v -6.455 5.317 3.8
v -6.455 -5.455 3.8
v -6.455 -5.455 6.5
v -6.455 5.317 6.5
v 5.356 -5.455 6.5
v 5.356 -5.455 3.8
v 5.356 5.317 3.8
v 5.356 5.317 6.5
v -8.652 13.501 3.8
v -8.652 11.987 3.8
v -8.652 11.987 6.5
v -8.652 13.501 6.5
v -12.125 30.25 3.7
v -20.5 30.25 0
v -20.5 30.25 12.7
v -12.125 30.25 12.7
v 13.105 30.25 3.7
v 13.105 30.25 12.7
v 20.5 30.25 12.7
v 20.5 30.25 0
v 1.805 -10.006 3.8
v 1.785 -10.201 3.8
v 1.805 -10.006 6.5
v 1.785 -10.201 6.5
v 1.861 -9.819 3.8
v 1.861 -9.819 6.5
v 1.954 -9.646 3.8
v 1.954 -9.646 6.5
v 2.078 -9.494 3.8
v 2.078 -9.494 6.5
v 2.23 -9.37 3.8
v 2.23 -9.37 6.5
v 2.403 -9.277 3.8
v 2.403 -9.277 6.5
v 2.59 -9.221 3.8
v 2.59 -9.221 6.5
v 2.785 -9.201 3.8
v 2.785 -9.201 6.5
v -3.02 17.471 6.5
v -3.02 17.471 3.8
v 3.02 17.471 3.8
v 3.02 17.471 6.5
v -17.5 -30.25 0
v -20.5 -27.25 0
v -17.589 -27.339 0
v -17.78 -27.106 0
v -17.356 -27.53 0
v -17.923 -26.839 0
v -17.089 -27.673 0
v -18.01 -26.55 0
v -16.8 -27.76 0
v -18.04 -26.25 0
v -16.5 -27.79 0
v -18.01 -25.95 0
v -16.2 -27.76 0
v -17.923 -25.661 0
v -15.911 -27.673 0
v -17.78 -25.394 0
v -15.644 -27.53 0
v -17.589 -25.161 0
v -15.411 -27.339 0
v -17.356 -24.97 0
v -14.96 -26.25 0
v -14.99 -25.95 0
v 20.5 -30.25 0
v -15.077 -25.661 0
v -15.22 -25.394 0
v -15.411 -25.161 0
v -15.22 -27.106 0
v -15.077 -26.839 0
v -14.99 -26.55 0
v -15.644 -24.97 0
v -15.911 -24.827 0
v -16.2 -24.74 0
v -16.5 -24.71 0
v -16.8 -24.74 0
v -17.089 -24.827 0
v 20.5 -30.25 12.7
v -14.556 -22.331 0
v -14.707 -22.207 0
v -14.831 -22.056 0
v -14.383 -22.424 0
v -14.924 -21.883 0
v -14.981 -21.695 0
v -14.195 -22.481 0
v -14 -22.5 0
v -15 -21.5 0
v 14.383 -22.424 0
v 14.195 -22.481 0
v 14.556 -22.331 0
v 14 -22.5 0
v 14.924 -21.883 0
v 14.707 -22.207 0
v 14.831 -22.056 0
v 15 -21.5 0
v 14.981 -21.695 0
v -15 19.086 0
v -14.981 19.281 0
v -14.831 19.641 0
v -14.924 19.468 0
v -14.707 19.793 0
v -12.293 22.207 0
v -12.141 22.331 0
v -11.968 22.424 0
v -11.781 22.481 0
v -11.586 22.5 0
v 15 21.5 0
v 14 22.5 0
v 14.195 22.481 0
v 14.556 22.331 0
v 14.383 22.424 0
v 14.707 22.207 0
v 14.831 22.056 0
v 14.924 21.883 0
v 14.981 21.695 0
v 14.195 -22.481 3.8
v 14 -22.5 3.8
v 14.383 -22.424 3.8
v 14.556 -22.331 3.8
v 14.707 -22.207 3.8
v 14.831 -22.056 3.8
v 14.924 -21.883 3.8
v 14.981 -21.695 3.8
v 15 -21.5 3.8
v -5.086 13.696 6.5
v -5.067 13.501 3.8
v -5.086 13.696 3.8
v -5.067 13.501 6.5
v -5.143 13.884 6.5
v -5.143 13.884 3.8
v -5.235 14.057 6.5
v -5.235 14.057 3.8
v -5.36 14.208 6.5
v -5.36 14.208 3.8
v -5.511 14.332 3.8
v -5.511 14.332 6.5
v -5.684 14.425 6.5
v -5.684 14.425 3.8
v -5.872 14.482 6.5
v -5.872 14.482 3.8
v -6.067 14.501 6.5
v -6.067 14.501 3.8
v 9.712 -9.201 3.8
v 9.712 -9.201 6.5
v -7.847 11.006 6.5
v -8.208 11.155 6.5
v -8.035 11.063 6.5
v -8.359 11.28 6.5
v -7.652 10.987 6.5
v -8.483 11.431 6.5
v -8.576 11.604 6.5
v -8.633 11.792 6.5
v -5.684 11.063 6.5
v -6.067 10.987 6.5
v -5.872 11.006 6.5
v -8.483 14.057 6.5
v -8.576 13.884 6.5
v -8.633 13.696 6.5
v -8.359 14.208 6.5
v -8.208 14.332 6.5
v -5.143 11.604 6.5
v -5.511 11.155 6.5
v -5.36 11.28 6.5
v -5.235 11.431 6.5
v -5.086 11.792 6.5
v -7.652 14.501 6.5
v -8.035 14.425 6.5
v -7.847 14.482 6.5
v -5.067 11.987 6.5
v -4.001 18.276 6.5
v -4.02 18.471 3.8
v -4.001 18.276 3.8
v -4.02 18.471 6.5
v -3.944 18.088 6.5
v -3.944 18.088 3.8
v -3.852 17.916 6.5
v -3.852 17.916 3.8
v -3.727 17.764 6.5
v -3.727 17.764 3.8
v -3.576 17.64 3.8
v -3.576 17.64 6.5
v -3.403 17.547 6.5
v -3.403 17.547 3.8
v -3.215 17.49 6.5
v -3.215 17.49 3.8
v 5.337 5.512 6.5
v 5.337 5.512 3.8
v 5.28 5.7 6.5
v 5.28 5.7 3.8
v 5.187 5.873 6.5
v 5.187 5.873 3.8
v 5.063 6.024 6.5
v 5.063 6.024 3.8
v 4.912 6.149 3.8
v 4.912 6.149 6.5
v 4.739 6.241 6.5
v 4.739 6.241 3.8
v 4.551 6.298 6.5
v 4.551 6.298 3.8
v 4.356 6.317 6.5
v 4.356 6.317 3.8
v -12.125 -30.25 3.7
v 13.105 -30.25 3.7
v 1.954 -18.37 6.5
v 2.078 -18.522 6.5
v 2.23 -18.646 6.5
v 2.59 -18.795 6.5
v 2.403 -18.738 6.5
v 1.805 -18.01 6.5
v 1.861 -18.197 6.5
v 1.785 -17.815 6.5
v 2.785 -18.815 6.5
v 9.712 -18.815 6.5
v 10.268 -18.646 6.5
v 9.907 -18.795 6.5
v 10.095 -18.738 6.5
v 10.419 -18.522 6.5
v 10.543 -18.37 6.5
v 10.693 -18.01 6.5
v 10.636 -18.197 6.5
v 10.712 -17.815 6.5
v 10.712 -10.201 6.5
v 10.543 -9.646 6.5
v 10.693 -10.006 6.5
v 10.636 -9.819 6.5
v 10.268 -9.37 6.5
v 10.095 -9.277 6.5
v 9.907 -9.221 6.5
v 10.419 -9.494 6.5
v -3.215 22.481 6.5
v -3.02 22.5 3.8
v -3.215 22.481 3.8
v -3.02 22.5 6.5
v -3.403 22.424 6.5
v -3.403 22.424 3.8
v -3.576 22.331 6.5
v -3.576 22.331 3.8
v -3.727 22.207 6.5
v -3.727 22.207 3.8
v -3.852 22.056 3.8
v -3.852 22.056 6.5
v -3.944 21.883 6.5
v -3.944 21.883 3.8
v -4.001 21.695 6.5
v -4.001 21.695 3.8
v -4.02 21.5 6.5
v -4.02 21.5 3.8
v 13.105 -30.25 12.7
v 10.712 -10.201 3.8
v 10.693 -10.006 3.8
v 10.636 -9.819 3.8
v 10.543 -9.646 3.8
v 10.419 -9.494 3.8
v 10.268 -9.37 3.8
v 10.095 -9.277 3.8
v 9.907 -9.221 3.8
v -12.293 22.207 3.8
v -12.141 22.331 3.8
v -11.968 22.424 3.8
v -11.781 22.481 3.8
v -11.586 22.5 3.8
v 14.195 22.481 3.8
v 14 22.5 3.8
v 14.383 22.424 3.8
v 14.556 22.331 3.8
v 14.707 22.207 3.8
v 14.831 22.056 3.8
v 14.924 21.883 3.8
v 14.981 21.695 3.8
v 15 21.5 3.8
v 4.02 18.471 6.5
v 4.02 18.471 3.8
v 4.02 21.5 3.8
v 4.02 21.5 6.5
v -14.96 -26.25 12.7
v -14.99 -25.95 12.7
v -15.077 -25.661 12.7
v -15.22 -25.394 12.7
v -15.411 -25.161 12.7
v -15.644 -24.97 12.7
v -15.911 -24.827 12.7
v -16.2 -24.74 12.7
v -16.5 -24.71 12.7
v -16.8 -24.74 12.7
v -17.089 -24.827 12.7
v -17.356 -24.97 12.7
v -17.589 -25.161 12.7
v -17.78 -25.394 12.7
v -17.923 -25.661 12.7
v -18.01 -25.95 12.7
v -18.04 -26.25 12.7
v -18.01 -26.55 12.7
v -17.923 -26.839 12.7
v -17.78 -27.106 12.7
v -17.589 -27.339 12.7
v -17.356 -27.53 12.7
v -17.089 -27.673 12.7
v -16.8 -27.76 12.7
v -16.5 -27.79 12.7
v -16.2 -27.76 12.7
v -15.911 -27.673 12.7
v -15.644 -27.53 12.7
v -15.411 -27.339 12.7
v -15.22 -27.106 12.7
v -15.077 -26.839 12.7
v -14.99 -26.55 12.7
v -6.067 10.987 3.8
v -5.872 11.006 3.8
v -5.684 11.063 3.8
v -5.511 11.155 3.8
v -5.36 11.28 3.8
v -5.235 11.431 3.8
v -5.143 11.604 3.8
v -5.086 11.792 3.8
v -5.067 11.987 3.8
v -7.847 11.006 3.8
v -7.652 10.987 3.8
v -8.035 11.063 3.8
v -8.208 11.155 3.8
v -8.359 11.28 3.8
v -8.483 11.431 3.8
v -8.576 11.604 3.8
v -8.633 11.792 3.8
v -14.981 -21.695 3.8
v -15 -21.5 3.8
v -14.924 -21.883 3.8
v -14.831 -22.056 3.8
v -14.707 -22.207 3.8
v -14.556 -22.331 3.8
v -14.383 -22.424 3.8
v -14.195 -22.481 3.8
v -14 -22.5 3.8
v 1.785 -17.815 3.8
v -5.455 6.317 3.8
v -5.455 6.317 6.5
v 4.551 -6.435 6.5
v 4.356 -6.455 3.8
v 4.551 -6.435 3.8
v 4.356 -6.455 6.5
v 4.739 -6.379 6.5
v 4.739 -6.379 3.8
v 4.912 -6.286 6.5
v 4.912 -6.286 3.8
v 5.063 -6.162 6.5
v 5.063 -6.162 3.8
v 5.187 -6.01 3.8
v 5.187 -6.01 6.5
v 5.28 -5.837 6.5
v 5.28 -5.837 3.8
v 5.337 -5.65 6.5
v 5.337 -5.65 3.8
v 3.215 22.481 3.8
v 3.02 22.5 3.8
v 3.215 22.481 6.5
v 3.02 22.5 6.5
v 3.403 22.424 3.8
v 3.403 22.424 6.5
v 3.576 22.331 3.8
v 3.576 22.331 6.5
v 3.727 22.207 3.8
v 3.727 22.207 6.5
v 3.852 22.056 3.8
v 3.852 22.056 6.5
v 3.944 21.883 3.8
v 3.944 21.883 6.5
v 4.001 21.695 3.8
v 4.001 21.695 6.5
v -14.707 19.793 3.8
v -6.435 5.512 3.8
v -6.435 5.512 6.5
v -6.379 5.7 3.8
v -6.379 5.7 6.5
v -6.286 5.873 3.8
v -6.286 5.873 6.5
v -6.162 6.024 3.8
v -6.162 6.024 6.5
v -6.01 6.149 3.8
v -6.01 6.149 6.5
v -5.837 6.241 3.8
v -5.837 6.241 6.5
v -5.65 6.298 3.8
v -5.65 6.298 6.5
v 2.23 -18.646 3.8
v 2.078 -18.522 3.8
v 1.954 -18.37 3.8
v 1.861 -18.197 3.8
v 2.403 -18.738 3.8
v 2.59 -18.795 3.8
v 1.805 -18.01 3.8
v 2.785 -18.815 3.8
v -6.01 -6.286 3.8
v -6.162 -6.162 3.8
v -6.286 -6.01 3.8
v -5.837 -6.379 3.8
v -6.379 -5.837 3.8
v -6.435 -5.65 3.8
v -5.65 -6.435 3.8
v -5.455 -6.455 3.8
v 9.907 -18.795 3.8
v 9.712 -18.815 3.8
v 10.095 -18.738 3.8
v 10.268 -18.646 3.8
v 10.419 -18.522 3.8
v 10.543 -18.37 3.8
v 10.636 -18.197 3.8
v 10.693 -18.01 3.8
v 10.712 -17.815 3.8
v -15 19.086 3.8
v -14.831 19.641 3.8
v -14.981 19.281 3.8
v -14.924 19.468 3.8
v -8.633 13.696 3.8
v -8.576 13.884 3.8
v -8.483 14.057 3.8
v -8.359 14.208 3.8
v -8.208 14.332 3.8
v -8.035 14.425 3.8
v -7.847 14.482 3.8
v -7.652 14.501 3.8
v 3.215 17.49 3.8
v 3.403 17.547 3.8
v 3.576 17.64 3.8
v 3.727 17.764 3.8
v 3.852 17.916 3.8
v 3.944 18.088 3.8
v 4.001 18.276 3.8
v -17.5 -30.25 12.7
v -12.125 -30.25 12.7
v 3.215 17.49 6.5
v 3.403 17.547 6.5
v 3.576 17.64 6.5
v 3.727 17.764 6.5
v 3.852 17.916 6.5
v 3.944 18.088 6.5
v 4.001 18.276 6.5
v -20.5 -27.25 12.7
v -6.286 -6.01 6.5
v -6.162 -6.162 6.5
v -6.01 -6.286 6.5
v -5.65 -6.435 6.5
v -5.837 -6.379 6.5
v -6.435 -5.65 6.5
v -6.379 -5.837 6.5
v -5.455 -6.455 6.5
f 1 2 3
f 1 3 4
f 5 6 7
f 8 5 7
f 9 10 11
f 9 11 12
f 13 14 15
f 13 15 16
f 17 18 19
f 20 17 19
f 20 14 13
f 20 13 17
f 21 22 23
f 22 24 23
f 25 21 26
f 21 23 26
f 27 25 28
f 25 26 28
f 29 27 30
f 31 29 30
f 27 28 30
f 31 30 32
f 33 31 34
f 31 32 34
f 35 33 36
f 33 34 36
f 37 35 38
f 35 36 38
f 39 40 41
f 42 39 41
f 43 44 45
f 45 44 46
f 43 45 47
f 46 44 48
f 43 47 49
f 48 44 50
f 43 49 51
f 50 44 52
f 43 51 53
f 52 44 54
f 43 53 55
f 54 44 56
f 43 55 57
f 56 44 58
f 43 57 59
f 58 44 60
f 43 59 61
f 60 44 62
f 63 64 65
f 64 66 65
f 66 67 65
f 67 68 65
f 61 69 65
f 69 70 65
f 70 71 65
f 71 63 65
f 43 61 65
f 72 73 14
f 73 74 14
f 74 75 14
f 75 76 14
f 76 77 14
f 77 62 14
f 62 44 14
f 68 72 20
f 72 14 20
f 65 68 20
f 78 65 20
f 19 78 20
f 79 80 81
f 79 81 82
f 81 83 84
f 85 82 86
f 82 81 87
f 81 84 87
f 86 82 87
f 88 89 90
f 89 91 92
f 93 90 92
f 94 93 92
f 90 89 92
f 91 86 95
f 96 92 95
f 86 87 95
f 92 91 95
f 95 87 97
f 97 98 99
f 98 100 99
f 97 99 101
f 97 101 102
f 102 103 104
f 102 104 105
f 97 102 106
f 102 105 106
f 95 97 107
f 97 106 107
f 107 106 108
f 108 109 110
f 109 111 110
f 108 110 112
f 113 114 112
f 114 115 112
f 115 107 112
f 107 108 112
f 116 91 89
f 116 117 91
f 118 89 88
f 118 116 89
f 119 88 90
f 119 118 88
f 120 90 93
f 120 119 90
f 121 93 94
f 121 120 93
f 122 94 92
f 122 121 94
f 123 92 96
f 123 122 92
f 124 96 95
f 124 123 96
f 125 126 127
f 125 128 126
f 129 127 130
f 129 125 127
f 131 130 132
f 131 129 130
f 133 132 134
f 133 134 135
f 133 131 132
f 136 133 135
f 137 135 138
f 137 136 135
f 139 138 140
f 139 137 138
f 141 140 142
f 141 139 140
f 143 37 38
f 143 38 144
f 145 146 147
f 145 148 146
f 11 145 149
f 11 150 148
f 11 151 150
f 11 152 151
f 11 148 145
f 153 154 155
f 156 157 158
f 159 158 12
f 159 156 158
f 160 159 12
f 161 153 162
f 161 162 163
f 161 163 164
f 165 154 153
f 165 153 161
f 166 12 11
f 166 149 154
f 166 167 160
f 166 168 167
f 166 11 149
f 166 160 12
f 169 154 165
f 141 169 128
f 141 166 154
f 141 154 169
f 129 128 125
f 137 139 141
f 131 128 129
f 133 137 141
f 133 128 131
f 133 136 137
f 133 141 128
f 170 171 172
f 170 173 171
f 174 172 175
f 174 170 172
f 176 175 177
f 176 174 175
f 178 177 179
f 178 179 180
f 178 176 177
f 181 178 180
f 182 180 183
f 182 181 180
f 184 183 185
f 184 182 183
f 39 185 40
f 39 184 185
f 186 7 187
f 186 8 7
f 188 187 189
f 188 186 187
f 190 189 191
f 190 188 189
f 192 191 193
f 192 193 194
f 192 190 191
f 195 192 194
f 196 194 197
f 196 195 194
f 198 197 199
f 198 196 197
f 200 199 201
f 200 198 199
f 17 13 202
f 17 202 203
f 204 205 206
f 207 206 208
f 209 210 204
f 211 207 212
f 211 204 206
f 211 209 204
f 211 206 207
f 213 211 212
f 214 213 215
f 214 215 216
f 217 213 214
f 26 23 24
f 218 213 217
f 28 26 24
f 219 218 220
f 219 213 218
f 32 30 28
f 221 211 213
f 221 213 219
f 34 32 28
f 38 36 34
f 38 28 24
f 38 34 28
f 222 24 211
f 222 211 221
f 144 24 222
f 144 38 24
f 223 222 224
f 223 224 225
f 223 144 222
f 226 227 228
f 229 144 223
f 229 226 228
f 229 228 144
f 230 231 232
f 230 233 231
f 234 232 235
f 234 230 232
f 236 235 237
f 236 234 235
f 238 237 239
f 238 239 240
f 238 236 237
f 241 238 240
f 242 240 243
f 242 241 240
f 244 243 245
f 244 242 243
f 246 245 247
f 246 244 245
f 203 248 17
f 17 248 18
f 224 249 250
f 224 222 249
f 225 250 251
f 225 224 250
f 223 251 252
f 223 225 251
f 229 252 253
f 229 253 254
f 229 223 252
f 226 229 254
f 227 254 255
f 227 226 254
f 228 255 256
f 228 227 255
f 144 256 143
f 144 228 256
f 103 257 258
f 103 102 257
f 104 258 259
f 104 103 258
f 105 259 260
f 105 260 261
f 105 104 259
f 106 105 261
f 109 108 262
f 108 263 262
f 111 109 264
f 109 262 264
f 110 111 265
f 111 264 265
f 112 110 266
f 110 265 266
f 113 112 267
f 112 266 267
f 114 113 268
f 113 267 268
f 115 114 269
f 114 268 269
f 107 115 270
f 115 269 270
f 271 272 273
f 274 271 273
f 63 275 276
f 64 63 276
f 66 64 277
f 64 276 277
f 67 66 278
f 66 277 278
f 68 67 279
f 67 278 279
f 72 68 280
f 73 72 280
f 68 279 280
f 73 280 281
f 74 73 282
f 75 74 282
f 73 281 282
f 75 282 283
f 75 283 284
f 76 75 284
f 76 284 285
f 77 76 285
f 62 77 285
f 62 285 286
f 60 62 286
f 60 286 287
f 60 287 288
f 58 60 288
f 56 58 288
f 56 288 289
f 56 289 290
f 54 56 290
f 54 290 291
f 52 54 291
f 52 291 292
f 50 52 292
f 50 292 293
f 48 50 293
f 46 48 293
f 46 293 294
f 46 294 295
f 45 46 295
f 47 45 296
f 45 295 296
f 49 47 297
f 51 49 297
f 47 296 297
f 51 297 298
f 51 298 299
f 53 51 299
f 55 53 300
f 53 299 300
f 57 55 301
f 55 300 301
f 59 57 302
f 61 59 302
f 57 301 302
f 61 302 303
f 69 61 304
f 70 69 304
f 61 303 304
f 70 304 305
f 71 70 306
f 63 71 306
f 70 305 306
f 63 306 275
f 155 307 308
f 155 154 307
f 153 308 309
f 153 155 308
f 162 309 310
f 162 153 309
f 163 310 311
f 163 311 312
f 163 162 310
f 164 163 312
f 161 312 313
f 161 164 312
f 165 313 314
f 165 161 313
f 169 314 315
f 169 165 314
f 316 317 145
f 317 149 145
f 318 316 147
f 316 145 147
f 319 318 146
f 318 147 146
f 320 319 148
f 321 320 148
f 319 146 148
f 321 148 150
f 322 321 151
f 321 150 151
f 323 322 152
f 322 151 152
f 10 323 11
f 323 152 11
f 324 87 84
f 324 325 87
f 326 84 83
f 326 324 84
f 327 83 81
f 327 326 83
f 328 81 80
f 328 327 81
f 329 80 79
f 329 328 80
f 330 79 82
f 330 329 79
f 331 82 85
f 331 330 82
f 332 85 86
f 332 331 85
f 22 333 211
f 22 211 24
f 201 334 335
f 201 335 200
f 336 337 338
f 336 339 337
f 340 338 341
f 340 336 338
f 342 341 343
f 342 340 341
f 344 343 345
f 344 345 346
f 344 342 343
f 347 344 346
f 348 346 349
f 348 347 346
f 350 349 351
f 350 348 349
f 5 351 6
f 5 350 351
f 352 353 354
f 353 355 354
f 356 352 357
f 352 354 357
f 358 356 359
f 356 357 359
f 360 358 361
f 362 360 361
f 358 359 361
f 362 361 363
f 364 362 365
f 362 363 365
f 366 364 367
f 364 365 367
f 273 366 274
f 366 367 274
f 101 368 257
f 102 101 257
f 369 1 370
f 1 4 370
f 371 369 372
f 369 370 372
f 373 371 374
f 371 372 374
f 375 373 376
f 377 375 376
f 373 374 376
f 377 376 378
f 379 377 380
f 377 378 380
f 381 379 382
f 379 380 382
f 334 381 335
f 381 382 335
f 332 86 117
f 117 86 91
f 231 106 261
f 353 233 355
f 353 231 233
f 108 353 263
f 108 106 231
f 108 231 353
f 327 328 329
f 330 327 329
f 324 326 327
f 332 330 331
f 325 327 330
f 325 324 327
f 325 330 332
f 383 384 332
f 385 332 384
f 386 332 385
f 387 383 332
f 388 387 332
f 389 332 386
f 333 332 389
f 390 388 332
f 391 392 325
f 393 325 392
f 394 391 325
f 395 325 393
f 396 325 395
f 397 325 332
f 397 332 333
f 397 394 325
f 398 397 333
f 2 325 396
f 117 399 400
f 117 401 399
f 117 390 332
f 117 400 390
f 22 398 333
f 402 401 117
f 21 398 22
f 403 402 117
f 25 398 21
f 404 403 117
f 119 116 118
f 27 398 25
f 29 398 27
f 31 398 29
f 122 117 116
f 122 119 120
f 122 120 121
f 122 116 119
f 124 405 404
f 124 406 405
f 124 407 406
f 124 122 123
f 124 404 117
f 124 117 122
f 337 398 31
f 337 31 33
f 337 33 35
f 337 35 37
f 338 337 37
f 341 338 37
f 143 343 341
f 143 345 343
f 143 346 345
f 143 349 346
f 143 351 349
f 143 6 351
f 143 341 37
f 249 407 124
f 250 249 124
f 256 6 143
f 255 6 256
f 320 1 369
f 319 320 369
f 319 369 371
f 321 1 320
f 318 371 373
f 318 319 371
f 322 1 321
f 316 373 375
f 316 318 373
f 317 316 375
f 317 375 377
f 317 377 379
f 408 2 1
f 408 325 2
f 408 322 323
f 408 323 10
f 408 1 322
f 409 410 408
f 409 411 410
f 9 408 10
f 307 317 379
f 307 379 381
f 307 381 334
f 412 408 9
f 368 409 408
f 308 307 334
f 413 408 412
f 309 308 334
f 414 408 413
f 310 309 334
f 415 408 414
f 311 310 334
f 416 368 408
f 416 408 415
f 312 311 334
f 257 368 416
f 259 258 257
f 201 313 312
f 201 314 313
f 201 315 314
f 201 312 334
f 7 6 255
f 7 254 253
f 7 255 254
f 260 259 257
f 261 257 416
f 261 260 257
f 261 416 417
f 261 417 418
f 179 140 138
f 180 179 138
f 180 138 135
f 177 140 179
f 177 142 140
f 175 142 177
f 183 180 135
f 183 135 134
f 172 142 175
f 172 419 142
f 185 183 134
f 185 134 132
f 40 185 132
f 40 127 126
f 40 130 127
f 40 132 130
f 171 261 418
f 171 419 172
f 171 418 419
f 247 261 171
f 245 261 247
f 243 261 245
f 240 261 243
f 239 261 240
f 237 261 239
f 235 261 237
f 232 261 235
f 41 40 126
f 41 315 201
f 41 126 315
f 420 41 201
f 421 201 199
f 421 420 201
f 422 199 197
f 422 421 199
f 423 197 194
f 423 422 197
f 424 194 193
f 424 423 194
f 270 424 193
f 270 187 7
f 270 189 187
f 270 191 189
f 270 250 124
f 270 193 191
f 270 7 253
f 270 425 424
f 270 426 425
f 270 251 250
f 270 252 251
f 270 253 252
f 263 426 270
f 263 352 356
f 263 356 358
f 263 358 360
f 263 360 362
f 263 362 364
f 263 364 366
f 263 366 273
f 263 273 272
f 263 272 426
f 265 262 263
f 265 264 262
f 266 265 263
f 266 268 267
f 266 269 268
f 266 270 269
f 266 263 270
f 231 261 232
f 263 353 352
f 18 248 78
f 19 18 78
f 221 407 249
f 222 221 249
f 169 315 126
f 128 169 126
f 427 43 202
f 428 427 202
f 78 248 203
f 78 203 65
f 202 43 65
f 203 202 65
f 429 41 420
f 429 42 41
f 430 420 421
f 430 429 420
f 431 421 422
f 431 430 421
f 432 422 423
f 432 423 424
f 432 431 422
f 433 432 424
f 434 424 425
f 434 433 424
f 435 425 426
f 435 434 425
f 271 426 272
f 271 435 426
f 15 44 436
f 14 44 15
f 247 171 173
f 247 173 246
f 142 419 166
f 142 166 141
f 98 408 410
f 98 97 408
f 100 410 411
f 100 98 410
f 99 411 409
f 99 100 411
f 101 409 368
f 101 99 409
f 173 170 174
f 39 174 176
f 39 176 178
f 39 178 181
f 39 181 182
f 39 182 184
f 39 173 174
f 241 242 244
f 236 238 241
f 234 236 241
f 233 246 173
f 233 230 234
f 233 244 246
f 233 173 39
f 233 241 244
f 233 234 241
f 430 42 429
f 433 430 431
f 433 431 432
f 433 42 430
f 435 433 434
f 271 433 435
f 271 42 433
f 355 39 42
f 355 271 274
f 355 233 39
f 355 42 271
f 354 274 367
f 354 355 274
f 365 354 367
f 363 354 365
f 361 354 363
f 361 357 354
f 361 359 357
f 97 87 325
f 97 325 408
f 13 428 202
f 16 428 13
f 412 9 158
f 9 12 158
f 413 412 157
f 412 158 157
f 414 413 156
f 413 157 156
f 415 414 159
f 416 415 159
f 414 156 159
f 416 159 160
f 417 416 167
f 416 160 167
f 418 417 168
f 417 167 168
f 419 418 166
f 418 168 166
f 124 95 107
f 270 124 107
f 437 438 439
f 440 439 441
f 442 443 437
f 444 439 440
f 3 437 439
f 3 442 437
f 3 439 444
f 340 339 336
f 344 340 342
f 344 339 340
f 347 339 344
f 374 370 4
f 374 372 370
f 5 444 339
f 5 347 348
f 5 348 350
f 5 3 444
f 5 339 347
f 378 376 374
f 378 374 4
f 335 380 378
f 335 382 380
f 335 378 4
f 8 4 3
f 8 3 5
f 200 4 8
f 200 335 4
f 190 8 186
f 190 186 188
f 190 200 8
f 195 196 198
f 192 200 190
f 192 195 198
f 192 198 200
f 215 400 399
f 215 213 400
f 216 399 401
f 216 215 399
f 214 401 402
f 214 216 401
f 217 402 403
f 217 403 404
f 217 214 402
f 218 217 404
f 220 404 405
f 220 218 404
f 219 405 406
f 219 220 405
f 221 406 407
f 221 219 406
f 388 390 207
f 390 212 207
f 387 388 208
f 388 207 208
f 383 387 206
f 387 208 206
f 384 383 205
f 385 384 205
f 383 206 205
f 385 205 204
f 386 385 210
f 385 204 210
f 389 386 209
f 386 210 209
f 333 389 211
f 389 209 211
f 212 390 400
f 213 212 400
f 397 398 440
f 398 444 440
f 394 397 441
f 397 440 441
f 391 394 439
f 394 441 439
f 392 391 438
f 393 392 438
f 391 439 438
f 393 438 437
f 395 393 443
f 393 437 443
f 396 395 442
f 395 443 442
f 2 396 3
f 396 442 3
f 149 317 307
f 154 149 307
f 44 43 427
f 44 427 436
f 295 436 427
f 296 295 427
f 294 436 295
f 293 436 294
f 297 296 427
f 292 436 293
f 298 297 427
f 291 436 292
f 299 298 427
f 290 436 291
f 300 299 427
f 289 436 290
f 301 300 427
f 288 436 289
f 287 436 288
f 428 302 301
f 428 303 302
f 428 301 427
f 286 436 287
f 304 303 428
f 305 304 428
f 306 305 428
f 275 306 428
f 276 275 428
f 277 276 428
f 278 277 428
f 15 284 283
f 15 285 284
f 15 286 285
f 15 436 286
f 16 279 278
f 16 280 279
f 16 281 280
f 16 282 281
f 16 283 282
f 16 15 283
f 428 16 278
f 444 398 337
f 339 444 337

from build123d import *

# Parameters (mm, degrees)
F0_W      = 41
F0_H      = 60.5
F1_DEPTH  = 12.7
F2_R      = 1.54
F3_DEPTH  = 25
F4_W      = 25.2301925793
F4_H      = 60.5
F5_DEPTH  = 9
F6_W      = 30
F6_H      = 45
F7_DEPTH  = 3.8
F8_W      = 11.8106110021
F8_H      = 12.7719389275
F8_W_2    = 8.9266251307
F8_H_2    = 9.6132867038
F8_W_3    = 8.0407429487
F8_H_3    = 5.028893277
F8_W_4    = 3.5852673464
F8_H_4    = 3.5143401474
F9_DEPTH  = 2.7
F11_DEPTH = 25
F12_R     = 1
F13_R     = 1


with BuildPart() as f1:
    # F0 (on Top) → F1 (new body)
    with BuildSketch(Plane.XY):
        Rectangle(F0_W, F0_H)
    extrude(amount=F1_DEPTH)

    # F2 (on face) → F3 (cut)
    with BuildSketch(Plane.XY.offset(12.7)):
        Polygon((-17.5, -30.25), (-20.5, -27.25), (-20.5, -30.25), align=None)
        with Locations((-16.5, -26.25)):
            Circle(F2_R)
    extrude(amount=-F3_DEPTH, mode=Mode.SUBTRACT)

    # F4 (on face) → F5 (cut)
    with BuildSketch(Plane.XY.offset(12.7)):
        with Locations((0.4899087362, 0)):
            Rectangle(F4_W, F4_H)
    extrude(amount=-F5_DEPTH, mode=Mode.SUBTRACT)


with BuildPart() as f7:
    # F6 (on Top) → F7 (new body)
    with BuildSketch(Plane.XY):
        Rectangle(F6_W, F6_H)
    extrude(amount=F7_DEPTH)

    # F8 (on face) → F9 (join)
    with BuildSketch(Plane.XY.offset(3.8)):
        with Locations((-0.5493303761, -0.0686664134)):
            Rectangle(F8_W, F8_H)
        with Locations((6.2486376846, -14.0079334378)):
            Rectangle(F8_W_2, F8_H_2)
        with Locations((0, 19.9855533615)):
            Rectangle(F8_W_3, F8_H_3)
        with Locations((-6.8593251053, 12.7437841147)):
            Rectangle(F8_W_4, F8_H_4)
    extrude(amount=F9_DEPTH)

    # F10 (on face) → F11 (cut)
    with BuildSketch(Plane.XY.offset(3.8)):
        Polygon((-15, 22.5), (-15, 19.5), (-12, 22.5), align=None)
    extrude(amount=-F11_DEPTH, mode=Mode.SUBTRACT)

    # F12
    f12_edges = [f7.edges().sort_by_distance(p)[0] for p in [
        (15, 22.5, 1.9),
        (15, -22.5, 1.9),
        (-15, -22.5, 1.9),
        (-15, 19.5, 1.9),
        (-12, 22.5, 1.9),
    ]]
    fillet(f12_edges, radius=F12_R)

    # F13
    f13_edges = [f7.edges().sort_by_distance(p)[0] for p in [
        (5.355975, -6.454636, 5.15),
        (-6.454636, -6.454636, 5.15),
        (1.785325, -18.814577, 5.15),
        (10.71195, -18.814577, 5.15),
        (5.355975, 6.317303, 5.15),
        (-8.651959, 10.986614, 5.15),
        (-5.066691, 10.986614, 5.15),
        (-5.066691, 14.500954, 5.15),
        (-4.020371, 17.471107, 5.15),
        (4.020371, 17.471107, 5.15),
        (4.020371, 22.5, 5.15),
        (-6.454636, 6.317303, 5.15),
        (-8.651959, 14.500954, 5.15),
        (1.785325, -9.20129, 5.15),
        (-4.020371, 22.5, 5.15),
        (10.71195, -9.20129, 5.15),
    ]]
    fillet(f13_edges, radius=F13_R)


solid = Compound([f1.part, f7.part])
